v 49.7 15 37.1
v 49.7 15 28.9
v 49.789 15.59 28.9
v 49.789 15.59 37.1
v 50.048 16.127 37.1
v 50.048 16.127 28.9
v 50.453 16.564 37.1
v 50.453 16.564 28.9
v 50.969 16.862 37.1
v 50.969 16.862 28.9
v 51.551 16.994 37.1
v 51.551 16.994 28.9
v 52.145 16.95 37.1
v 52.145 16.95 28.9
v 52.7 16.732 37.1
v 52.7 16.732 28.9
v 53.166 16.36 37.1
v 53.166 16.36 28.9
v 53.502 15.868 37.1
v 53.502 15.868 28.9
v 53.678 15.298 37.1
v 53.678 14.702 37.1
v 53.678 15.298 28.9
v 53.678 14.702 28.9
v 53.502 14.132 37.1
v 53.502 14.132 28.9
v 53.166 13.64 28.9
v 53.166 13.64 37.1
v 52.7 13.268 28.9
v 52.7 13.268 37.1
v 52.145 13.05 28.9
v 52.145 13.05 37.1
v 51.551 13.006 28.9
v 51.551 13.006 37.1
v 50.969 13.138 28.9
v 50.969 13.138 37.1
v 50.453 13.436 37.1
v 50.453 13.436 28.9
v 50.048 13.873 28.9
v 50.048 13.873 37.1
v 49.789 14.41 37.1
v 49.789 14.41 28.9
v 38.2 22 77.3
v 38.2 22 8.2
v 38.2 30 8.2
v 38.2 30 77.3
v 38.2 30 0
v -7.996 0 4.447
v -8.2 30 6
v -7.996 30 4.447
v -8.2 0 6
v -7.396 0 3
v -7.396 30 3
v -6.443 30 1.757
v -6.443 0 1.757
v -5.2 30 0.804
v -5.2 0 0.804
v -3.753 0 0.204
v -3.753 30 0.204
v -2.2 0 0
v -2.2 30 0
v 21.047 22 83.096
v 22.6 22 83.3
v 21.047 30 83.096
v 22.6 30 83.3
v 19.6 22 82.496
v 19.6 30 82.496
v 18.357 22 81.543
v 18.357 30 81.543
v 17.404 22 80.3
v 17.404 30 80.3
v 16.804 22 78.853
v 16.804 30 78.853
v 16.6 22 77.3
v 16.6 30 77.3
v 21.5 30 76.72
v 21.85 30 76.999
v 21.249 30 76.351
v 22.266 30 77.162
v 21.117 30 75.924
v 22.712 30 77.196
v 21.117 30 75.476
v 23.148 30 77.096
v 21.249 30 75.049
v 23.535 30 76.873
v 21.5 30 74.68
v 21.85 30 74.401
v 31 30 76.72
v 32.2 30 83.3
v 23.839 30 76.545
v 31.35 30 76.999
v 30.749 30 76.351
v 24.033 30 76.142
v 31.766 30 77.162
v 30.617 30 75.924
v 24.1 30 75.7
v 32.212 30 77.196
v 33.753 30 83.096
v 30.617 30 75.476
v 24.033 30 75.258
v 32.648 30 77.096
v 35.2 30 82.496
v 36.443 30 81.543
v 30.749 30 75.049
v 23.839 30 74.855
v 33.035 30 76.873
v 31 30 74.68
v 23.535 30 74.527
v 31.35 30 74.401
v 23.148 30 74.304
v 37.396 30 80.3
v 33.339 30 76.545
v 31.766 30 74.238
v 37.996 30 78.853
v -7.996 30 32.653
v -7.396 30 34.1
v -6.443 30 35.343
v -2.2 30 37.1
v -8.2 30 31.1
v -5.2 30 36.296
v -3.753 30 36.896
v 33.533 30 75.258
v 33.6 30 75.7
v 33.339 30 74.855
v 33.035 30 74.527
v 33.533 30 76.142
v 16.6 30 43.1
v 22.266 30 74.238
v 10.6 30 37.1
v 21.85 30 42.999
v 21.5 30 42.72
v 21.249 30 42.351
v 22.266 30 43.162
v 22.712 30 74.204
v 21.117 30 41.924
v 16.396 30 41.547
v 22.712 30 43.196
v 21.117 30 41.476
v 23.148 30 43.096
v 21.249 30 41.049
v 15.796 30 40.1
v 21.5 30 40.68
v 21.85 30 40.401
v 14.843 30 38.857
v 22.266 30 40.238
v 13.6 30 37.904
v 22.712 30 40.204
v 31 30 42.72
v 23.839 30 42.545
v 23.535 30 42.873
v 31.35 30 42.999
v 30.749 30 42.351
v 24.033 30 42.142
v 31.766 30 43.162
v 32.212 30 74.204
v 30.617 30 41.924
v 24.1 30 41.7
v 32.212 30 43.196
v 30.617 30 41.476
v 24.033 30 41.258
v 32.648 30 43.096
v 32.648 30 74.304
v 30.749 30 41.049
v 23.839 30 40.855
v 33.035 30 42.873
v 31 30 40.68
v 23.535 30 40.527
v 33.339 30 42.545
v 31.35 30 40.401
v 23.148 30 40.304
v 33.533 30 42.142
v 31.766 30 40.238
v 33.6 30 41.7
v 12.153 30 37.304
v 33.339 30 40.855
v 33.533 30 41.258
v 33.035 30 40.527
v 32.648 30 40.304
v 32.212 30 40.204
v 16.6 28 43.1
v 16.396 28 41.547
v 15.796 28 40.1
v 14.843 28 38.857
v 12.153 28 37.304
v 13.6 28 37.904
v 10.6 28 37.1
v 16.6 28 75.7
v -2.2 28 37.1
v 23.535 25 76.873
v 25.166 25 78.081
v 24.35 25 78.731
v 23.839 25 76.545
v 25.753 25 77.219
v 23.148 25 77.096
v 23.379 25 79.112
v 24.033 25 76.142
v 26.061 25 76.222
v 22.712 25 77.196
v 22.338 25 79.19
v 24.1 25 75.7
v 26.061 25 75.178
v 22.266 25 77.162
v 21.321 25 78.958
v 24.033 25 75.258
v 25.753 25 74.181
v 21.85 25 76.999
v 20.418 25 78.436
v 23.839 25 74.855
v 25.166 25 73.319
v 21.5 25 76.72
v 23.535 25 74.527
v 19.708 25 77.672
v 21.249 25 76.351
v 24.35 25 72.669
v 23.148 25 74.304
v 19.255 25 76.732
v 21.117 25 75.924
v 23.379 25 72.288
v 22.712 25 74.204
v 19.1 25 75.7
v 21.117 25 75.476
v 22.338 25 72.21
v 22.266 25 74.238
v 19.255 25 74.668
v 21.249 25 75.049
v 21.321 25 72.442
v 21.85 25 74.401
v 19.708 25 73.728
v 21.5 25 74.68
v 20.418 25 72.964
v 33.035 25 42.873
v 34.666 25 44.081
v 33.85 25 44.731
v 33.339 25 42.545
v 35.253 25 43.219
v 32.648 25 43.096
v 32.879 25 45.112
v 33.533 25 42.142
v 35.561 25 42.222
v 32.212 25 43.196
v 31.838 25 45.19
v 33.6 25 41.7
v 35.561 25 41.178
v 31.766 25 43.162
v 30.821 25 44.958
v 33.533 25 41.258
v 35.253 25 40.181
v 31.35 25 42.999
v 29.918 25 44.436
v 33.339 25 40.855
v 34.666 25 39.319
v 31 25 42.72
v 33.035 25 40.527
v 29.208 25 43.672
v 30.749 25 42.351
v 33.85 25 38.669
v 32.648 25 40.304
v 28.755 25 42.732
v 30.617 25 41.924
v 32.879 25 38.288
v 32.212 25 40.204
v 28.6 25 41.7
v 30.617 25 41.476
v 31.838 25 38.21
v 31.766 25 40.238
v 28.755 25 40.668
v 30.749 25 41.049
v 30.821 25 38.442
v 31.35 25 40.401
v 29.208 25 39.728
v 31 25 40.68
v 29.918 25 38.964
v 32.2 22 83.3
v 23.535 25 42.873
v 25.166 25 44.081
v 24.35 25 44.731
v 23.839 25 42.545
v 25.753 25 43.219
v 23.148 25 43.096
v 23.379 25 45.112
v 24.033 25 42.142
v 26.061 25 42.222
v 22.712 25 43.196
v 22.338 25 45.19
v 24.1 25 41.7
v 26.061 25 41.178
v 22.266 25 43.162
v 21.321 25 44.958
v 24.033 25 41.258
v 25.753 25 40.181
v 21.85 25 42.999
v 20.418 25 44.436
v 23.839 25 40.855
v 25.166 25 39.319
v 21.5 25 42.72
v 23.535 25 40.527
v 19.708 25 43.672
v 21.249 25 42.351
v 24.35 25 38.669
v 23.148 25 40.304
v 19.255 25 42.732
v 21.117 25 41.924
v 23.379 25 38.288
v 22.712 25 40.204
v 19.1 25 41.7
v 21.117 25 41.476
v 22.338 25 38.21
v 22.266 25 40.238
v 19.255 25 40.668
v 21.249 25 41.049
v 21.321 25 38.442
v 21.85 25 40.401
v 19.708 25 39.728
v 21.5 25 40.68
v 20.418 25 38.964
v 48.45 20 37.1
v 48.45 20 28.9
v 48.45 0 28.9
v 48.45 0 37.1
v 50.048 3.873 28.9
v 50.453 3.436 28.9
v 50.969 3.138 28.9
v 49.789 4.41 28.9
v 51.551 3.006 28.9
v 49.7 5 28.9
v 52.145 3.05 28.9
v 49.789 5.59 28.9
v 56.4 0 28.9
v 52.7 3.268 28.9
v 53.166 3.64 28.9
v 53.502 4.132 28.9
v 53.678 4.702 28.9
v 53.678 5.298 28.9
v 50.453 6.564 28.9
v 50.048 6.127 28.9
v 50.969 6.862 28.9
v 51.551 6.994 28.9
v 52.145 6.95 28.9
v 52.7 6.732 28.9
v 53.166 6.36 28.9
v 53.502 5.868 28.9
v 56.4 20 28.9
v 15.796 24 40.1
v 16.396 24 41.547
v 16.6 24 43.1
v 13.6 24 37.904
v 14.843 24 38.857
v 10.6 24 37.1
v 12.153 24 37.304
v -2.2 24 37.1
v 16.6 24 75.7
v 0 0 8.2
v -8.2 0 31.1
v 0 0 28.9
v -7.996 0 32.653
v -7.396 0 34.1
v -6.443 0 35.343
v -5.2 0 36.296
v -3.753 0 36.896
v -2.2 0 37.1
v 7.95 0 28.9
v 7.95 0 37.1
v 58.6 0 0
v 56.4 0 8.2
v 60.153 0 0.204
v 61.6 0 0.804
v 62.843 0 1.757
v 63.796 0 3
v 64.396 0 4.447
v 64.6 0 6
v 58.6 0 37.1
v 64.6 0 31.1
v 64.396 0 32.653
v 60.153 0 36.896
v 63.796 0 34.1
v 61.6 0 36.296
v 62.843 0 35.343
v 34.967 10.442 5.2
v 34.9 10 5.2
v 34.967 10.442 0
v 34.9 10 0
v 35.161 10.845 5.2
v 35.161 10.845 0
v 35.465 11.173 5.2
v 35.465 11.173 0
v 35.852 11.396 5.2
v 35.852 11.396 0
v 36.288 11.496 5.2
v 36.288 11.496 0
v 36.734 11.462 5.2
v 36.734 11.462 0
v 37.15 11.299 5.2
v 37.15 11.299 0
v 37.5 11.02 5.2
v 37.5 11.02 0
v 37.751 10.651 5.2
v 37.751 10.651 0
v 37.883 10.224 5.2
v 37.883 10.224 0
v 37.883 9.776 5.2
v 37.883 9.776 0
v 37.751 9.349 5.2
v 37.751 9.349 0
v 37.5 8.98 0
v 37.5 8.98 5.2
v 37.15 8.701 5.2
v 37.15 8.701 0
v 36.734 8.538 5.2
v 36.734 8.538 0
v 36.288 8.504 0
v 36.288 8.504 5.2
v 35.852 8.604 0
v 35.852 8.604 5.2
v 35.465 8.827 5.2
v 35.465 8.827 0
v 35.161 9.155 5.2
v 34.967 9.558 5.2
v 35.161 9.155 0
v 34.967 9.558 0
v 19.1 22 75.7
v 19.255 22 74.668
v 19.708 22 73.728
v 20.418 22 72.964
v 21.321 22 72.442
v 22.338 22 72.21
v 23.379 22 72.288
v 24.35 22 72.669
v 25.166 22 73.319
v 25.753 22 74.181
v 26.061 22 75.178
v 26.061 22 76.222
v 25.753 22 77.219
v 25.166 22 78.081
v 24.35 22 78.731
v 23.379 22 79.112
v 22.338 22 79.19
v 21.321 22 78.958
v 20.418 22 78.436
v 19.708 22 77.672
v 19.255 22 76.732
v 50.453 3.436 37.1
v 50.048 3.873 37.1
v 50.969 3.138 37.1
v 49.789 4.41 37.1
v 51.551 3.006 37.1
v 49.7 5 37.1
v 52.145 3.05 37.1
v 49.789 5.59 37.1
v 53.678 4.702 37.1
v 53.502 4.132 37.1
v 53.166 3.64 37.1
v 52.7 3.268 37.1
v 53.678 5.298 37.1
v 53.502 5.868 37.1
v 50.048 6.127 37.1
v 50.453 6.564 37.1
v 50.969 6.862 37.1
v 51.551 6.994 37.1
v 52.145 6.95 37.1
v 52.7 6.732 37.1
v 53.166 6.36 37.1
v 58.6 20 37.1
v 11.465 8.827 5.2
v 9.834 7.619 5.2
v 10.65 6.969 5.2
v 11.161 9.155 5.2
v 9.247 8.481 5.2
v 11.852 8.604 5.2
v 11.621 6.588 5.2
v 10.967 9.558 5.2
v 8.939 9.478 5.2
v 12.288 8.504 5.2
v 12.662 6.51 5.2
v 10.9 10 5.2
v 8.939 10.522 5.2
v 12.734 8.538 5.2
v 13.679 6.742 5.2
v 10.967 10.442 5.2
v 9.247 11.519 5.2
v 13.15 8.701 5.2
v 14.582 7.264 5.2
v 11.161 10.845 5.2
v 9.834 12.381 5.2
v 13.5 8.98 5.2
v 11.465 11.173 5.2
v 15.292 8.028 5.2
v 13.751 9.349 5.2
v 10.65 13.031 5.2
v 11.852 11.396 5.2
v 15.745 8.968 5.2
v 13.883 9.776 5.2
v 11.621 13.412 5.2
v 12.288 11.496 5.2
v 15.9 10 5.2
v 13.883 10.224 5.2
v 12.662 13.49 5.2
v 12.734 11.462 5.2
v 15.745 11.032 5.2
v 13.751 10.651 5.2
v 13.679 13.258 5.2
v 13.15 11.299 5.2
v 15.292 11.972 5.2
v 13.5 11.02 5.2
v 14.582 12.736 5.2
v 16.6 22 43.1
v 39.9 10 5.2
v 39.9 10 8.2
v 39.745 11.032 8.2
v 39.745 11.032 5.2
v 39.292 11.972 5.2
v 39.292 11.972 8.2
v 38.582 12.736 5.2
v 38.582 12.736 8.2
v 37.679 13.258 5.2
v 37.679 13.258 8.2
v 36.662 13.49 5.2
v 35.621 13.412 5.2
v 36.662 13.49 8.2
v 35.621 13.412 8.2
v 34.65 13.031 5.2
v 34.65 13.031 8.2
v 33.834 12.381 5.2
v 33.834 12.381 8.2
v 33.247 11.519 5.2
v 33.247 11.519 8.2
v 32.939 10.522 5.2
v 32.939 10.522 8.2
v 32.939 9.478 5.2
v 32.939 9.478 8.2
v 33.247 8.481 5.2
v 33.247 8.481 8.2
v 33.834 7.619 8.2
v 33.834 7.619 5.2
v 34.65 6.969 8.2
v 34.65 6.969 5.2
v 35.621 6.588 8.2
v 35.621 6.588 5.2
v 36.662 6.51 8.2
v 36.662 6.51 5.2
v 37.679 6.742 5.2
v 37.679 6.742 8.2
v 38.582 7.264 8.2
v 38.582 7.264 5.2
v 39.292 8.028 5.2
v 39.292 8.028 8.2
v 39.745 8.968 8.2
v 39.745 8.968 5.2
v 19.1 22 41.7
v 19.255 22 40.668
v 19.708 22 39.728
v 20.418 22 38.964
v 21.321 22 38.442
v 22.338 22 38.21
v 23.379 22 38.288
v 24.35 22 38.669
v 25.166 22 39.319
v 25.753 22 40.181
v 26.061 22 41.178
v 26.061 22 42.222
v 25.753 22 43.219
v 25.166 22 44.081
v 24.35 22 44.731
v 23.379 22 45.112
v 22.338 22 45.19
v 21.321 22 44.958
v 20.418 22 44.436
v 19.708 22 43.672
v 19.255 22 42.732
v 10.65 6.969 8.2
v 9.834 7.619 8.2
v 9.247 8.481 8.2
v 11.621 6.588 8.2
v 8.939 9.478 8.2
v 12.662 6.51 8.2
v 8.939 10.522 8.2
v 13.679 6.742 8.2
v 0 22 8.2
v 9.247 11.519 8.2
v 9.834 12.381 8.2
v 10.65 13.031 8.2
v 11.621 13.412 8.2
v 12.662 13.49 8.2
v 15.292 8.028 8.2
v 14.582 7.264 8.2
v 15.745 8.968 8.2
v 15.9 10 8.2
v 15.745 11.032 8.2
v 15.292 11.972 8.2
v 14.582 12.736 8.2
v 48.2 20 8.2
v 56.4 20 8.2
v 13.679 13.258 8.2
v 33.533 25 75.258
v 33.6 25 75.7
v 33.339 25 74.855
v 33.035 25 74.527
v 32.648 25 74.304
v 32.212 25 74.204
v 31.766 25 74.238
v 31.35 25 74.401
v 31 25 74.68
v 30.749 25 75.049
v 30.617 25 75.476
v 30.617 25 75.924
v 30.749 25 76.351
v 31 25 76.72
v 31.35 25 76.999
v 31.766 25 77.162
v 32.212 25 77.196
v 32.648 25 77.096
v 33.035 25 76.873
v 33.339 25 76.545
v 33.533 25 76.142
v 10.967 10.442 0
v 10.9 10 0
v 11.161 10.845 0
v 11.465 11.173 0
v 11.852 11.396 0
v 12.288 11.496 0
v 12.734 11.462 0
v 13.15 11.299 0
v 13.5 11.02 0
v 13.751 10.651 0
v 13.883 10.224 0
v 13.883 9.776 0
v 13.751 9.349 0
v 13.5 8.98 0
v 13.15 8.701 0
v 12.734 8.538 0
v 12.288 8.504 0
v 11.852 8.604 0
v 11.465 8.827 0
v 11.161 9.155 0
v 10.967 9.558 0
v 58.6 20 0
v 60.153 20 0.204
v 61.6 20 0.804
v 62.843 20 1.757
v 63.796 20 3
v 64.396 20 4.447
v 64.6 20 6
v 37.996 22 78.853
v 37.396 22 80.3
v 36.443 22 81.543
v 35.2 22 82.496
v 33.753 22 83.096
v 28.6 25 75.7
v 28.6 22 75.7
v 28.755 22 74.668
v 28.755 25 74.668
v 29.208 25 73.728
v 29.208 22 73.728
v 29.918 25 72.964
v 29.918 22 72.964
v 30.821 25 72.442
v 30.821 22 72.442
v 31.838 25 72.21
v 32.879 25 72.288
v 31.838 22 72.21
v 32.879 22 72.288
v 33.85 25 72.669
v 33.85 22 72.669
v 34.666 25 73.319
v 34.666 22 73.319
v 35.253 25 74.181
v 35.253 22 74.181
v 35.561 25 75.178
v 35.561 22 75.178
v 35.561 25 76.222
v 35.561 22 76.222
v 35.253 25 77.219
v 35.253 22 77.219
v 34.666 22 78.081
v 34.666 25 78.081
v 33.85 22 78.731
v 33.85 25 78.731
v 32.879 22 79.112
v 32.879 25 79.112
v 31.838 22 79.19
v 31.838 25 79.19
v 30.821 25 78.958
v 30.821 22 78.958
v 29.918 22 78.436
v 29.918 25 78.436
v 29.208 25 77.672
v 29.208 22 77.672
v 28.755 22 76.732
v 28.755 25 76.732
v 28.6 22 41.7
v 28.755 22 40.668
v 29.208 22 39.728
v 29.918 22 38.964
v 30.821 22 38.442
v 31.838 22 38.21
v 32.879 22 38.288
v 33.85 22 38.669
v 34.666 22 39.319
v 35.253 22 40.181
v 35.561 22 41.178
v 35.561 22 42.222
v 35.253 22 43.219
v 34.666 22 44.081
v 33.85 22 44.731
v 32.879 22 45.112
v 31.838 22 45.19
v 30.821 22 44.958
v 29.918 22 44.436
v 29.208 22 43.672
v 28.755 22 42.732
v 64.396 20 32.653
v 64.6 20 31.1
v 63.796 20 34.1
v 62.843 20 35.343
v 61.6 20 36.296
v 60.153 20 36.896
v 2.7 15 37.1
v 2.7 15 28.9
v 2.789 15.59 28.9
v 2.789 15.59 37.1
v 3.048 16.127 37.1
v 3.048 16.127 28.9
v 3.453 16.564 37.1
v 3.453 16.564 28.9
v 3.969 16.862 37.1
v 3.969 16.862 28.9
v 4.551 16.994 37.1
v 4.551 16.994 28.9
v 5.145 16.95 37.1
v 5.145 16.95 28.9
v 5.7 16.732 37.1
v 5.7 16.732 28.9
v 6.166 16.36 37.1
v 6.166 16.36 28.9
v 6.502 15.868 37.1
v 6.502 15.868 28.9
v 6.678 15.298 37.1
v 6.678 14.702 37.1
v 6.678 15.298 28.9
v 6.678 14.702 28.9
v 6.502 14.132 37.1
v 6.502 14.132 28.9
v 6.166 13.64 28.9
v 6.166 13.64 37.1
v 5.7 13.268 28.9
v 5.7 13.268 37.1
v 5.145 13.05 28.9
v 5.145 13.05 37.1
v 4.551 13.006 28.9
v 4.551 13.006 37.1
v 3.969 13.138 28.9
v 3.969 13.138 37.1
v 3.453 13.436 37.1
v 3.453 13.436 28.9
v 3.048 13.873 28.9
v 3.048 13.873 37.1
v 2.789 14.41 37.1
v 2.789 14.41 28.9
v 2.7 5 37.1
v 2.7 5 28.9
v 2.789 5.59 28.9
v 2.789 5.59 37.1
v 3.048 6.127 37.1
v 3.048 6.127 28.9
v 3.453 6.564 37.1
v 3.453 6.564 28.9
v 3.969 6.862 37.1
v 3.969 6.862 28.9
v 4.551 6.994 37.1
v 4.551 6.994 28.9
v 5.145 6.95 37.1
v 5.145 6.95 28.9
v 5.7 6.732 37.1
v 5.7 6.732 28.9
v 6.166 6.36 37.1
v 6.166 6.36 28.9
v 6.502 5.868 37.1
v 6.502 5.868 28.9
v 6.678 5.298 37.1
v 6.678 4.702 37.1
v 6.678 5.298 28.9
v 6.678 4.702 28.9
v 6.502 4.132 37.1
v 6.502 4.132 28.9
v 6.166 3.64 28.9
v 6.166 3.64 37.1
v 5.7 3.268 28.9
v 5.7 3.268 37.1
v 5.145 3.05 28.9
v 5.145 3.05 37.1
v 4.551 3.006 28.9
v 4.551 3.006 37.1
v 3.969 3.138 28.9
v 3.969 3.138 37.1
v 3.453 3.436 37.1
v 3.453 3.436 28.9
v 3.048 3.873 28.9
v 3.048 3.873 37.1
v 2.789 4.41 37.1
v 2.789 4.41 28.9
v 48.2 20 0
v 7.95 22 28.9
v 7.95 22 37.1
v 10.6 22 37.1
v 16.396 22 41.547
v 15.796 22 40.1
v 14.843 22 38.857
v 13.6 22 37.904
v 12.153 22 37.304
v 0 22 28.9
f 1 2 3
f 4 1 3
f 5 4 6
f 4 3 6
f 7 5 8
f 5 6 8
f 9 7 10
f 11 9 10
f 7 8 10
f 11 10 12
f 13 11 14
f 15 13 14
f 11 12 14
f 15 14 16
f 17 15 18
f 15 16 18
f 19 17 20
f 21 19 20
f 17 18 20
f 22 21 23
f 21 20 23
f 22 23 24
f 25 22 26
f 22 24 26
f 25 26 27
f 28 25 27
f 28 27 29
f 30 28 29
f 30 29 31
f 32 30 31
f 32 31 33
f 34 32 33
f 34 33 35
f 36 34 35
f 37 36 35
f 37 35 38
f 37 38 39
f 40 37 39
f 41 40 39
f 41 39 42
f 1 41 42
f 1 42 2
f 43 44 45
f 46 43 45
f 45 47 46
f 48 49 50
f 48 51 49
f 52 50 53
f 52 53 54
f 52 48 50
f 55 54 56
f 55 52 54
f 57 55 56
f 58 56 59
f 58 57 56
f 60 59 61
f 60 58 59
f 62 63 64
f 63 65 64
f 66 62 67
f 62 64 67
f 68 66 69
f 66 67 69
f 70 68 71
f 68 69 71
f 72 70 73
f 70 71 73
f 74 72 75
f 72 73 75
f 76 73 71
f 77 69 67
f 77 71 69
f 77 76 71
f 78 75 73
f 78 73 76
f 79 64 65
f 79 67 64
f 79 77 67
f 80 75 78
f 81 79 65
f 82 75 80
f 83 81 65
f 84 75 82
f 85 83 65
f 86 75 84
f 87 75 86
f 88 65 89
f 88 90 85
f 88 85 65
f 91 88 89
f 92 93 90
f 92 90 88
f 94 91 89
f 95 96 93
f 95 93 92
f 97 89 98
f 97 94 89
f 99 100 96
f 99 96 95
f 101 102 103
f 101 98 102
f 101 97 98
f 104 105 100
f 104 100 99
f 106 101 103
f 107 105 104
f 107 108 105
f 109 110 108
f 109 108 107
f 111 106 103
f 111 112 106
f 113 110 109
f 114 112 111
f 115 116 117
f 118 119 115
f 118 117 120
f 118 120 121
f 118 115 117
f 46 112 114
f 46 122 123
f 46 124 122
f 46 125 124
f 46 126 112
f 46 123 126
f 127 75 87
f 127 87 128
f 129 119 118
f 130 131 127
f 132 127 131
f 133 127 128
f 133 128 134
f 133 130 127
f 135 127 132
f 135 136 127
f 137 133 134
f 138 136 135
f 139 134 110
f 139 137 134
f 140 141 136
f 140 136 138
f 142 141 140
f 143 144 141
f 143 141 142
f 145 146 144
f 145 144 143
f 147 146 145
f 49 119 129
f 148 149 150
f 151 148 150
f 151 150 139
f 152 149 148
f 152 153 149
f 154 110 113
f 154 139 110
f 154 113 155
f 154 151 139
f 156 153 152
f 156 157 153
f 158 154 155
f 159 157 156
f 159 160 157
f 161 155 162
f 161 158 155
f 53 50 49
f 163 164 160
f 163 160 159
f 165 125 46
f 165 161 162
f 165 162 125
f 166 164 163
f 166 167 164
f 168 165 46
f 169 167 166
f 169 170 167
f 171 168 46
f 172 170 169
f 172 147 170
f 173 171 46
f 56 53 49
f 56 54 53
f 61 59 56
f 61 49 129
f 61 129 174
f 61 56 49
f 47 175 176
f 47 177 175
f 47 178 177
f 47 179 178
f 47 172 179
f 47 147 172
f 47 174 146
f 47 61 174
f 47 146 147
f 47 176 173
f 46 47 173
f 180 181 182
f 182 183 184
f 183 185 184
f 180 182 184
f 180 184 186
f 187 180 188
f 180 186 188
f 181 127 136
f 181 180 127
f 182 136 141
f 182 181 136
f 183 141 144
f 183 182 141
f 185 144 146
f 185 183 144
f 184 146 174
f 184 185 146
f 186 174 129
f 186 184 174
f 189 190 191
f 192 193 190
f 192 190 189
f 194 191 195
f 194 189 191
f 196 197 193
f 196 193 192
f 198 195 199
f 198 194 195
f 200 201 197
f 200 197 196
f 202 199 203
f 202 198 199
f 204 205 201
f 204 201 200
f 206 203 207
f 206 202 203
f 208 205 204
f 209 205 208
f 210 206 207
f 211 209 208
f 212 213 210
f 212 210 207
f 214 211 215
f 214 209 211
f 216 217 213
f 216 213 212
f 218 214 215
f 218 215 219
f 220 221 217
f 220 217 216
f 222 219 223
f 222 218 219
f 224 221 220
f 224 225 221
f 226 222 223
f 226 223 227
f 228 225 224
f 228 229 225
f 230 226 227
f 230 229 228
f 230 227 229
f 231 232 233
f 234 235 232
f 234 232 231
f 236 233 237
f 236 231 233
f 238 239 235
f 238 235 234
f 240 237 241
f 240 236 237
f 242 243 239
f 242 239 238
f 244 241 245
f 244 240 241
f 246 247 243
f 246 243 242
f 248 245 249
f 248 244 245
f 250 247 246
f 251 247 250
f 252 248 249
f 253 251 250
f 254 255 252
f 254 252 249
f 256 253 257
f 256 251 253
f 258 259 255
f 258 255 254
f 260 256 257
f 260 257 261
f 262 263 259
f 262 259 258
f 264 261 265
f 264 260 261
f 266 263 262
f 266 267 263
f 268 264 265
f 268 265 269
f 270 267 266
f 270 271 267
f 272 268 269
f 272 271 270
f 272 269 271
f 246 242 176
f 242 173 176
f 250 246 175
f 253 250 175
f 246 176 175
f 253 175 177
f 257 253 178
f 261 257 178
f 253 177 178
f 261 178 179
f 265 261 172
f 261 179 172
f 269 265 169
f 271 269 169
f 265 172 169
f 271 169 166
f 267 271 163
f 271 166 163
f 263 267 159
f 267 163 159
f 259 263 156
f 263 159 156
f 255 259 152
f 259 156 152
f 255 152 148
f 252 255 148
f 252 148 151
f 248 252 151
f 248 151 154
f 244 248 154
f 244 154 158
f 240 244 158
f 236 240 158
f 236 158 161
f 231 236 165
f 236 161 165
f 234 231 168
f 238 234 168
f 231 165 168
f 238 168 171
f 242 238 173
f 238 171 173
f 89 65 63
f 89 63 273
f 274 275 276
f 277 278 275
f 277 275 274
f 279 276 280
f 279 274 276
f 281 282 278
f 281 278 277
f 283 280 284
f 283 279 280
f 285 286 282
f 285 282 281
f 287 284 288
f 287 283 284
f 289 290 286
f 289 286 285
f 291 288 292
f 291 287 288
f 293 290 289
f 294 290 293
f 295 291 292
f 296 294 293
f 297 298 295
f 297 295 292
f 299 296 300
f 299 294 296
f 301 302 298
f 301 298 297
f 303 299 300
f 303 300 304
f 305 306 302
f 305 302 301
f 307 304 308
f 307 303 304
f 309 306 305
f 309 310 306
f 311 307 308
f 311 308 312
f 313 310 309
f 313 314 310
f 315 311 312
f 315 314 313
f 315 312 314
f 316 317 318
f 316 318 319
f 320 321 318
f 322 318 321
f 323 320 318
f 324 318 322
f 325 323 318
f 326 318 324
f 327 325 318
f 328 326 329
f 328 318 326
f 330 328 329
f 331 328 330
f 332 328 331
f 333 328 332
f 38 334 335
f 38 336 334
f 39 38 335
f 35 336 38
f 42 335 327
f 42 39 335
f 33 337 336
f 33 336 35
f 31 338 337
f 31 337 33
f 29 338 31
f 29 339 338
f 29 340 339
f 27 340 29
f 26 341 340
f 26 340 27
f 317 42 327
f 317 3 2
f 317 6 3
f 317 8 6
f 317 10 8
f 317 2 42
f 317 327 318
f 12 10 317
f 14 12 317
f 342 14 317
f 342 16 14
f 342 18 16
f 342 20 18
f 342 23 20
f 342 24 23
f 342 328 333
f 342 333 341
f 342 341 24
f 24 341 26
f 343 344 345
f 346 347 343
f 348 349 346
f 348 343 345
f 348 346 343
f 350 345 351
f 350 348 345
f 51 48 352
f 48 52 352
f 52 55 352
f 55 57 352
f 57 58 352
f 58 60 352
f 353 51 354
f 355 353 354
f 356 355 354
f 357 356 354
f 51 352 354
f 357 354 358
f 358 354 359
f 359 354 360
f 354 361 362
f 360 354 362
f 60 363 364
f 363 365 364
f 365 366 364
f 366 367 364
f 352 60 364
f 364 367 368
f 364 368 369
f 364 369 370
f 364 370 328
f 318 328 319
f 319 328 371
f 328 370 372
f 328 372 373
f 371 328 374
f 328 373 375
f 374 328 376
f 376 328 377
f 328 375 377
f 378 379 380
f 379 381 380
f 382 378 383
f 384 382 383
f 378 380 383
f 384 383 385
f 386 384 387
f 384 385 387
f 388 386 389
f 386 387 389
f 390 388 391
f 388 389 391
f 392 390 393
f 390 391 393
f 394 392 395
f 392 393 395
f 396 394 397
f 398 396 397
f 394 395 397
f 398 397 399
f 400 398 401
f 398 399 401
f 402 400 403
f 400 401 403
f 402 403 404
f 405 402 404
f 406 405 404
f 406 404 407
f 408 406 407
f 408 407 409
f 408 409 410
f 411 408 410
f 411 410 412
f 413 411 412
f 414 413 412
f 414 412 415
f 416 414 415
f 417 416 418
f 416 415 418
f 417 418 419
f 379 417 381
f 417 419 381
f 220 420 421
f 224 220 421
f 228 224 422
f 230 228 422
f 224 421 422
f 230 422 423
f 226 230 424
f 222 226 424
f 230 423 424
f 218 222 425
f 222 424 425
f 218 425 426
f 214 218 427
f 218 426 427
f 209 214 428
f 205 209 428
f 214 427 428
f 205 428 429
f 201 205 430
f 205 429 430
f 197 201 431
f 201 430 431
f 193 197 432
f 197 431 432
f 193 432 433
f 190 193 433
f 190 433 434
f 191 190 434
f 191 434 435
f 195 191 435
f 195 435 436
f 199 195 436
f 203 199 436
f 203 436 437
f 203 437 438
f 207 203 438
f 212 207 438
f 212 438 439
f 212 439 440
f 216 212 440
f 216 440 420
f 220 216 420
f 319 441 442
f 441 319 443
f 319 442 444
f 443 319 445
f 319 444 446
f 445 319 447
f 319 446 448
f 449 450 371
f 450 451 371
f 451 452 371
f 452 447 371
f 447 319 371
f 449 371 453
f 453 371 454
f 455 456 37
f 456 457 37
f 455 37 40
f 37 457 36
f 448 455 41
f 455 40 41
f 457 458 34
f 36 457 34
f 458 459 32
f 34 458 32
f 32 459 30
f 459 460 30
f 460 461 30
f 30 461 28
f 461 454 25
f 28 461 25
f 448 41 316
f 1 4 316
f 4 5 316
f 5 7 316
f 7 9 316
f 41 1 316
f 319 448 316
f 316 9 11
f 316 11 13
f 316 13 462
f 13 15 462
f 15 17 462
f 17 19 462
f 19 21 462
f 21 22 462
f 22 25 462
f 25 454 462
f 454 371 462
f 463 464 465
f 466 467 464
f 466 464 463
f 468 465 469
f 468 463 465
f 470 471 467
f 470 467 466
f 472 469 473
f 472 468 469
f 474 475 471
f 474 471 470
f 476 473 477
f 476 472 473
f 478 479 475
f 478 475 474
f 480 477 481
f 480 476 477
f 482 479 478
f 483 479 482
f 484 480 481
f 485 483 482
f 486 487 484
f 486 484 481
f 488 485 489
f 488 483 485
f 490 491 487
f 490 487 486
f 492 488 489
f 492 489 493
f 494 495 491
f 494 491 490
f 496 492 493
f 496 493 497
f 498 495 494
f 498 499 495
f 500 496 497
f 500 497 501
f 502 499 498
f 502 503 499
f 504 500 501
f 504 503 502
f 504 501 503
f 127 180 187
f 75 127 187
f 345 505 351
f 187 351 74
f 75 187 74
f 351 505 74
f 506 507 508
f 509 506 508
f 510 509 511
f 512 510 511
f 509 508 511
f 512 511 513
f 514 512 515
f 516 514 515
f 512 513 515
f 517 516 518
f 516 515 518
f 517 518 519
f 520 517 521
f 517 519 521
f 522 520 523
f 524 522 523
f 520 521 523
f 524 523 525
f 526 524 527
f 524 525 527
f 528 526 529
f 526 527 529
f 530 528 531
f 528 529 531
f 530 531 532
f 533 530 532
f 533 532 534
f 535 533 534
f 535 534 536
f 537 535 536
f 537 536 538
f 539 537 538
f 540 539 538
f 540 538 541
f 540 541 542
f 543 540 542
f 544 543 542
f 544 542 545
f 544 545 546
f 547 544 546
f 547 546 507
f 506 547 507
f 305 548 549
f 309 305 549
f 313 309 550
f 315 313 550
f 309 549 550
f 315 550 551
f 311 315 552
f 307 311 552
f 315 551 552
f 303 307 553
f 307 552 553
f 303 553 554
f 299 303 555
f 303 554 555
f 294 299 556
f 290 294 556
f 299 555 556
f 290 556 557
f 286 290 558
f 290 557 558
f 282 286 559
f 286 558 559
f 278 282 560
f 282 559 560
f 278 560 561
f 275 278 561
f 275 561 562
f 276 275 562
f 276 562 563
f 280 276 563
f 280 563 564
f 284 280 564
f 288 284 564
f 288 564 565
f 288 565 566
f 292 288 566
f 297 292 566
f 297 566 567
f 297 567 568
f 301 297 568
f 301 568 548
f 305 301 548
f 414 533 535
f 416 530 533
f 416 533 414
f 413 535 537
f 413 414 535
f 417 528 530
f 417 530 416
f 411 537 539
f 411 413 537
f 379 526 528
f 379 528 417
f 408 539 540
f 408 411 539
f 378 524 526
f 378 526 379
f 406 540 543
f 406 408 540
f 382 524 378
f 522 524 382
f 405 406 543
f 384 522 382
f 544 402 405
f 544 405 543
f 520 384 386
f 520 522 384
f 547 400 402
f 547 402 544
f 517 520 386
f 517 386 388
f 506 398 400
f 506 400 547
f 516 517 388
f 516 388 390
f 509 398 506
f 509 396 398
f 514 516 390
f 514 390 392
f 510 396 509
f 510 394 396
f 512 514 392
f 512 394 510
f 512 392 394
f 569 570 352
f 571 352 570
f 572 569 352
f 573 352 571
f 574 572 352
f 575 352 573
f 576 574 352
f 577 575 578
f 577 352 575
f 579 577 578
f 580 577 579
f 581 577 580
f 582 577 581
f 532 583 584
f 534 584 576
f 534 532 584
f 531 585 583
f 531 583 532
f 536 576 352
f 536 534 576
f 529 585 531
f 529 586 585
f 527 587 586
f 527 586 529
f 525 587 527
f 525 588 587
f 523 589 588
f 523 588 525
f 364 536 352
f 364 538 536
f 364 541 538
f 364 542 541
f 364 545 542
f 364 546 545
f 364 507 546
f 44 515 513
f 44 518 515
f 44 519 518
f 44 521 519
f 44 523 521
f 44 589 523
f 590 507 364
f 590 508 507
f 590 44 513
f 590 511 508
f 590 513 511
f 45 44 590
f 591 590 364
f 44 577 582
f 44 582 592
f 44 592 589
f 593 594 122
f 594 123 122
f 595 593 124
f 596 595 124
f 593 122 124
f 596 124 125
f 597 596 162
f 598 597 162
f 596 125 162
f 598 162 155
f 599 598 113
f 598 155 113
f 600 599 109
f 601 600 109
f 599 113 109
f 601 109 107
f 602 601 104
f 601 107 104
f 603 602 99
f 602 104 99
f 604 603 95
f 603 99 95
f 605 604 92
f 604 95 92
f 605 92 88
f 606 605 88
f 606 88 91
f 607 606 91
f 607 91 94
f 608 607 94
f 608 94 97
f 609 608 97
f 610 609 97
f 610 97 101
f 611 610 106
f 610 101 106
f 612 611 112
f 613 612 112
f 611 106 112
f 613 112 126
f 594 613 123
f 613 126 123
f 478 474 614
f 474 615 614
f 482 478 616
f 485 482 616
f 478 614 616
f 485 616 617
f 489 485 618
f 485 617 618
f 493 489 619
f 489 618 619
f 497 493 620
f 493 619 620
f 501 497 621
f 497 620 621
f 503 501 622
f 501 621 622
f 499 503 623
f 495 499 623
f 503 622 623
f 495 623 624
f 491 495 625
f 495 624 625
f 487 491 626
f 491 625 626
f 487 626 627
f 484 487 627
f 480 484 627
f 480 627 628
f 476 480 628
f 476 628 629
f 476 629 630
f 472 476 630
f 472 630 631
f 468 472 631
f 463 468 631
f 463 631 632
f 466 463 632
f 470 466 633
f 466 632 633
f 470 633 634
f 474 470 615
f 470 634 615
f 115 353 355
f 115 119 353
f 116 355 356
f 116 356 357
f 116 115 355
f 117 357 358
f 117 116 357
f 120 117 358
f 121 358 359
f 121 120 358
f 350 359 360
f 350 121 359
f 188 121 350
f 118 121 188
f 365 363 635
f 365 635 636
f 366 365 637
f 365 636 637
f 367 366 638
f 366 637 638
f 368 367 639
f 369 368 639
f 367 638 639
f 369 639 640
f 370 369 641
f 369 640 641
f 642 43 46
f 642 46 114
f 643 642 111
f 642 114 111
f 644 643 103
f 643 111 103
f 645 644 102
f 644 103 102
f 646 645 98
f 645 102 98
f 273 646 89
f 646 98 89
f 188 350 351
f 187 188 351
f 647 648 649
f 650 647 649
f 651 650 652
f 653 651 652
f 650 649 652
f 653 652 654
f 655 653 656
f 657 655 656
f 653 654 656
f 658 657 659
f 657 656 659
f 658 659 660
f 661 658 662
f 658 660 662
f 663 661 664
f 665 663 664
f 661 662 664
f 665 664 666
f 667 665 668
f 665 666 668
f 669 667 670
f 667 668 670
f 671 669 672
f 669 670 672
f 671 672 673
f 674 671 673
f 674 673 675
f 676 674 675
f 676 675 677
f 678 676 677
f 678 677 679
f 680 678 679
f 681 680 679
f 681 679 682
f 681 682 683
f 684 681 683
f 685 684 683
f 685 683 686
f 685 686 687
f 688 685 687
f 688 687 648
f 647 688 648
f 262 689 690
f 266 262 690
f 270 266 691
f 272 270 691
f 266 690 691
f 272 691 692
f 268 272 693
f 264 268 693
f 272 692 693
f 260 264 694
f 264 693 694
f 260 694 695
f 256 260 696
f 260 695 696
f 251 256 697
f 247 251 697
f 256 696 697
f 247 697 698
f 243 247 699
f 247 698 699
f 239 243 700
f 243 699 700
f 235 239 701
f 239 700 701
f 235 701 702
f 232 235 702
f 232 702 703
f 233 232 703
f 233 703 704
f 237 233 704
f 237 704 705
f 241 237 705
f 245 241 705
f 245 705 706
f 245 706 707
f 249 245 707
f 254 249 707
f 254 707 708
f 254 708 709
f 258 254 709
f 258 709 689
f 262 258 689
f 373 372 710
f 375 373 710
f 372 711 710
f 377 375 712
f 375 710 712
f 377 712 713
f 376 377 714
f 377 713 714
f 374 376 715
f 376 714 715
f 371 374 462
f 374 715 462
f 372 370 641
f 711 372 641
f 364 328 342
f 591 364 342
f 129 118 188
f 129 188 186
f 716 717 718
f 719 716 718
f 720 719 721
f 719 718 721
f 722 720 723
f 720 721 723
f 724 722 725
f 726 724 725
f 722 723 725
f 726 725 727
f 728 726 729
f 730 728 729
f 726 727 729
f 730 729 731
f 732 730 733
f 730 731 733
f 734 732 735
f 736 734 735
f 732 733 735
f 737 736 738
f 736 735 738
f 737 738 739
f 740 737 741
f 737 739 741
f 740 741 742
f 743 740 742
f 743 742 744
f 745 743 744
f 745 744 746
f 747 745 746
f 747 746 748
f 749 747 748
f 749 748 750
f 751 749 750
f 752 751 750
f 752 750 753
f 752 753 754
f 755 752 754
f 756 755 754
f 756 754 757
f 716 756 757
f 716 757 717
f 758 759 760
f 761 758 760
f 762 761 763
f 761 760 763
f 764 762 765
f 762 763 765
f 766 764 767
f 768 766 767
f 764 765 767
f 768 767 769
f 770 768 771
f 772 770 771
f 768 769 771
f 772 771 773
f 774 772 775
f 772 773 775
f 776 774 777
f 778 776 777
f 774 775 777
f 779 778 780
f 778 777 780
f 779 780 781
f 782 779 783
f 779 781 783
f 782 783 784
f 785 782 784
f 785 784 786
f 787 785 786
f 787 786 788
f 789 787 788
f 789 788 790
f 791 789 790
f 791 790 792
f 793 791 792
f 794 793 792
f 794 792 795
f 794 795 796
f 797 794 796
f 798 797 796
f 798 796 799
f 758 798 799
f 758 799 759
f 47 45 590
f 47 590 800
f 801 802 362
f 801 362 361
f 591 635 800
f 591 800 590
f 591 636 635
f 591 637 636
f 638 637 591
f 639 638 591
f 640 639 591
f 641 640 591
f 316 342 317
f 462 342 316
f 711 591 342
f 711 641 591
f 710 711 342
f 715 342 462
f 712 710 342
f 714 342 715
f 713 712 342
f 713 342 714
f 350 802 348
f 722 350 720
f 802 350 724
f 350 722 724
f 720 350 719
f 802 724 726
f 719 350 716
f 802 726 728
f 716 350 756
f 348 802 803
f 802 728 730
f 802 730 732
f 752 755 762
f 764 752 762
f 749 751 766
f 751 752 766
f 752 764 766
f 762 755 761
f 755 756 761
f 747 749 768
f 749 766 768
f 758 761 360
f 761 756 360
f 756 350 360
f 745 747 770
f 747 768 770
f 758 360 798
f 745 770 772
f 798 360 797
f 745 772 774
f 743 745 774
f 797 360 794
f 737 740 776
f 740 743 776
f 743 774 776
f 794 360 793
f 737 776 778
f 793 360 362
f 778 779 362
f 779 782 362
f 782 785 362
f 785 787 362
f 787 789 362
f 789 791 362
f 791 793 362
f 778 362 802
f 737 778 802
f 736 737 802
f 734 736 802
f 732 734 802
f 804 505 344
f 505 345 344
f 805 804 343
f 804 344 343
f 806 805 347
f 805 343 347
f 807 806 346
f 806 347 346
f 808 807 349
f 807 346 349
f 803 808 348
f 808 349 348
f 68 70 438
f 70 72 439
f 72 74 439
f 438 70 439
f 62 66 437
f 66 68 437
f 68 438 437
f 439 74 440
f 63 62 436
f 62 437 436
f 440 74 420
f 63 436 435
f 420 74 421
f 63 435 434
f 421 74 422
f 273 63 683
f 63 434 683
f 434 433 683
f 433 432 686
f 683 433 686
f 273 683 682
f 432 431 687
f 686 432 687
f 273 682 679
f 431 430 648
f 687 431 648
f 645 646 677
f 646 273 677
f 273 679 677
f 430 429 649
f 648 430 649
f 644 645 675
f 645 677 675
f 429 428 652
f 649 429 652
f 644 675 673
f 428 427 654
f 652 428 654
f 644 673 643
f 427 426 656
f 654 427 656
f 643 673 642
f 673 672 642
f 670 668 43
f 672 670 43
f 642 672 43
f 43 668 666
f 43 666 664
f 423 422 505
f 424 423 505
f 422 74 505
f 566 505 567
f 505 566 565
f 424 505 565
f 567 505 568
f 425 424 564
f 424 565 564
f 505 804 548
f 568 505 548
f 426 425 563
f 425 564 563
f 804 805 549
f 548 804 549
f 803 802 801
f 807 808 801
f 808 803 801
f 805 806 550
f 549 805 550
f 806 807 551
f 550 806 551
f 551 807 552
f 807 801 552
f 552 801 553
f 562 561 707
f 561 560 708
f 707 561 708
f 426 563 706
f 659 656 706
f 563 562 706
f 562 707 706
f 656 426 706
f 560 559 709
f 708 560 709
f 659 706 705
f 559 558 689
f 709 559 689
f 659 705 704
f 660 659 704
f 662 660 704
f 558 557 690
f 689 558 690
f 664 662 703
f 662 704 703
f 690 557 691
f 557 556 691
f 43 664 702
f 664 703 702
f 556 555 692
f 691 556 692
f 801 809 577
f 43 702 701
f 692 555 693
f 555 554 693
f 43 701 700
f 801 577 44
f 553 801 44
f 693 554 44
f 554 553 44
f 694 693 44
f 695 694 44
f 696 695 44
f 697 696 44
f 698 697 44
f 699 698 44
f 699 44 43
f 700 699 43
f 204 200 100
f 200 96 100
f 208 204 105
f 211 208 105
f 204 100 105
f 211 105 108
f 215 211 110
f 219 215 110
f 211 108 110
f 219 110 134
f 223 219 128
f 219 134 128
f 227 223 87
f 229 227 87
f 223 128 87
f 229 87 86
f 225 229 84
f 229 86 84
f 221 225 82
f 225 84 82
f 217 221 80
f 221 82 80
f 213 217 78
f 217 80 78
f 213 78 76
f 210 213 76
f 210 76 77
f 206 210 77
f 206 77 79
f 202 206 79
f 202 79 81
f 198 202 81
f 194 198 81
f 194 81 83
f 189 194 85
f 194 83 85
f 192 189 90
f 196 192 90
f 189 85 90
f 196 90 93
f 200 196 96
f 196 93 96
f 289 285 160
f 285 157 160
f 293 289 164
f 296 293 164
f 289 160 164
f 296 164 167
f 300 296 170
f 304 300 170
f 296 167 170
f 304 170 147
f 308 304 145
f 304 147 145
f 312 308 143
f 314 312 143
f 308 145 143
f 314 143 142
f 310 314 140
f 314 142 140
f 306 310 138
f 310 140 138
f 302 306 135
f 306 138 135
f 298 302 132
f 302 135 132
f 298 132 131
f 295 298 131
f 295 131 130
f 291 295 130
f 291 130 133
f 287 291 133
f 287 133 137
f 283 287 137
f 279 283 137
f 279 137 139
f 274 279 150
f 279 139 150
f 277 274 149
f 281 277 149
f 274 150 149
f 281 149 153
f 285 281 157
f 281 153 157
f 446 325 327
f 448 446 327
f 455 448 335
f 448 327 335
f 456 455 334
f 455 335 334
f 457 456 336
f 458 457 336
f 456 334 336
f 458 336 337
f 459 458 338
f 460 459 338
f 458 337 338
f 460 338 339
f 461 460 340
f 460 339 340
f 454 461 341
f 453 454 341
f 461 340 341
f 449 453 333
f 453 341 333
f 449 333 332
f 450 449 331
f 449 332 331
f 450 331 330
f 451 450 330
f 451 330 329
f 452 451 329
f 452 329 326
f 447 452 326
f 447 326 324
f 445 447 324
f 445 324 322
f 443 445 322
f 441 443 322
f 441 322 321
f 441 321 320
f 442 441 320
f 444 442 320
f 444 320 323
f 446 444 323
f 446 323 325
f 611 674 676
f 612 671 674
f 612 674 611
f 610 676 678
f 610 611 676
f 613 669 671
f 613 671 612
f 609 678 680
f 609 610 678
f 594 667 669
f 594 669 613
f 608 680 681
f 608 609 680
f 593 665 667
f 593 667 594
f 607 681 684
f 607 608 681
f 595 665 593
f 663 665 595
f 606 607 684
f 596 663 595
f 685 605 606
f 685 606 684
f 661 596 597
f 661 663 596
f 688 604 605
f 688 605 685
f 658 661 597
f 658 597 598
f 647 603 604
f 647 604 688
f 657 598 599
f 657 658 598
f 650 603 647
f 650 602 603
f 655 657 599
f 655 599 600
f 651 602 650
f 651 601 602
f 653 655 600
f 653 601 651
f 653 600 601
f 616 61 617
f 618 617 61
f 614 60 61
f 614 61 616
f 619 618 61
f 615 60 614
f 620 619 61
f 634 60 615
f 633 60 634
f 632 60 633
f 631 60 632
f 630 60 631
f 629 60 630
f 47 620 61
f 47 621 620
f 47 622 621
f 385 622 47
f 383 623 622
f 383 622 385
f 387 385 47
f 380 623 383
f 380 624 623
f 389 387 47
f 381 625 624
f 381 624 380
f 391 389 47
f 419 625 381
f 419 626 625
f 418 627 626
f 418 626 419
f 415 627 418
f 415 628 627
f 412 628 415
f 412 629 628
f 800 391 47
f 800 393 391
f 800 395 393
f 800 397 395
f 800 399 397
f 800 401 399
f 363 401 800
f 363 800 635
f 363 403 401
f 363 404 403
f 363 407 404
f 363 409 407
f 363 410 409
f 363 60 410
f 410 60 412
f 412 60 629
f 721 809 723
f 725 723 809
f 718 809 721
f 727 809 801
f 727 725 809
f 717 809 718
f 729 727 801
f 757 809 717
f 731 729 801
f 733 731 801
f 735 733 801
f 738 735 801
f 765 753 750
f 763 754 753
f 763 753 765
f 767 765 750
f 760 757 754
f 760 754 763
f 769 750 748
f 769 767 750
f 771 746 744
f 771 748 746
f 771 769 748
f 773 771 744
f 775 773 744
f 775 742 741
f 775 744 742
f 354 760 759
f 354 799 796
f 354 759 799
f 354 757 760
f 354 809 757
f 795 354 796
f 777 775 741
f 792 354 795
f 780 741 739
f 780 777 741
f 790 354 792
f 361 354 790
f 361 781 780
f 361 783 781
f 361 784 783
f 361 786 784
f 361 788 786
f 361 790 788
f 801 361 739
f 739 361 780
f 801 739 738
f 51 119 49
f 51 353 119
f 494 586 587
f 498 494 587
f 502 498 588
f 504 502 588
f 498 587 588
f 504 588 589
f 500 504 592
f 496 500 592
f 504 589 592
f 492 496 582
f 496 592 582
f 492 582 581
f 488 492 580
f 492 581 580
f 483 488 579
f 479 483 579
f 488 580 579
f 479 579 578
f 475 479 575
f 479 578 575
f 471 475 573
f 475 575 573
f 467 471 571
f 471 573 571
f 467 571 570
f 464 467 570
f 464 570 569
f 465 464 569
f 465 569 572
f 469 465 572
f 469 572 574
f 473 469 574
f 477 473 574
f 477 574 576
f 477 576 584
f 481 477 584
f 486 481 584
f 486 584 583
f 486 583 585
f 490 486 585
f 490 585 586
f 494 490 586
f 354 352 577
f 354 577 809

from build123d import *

# Parameters (mm, degrees)
SCHIZZO1_W                                   = 64.6
SCHIZZO1_H                                   = 20
ESTRUSIONE_ESTRUSIONE1_DEPTH                 = 8.2
SCHIZZO2_W                                   = 8.2
SCHIZZO2_H                                   = 20
ESTRUSIONE_ESTRUSIONE2_DEPTH                 = 28.9
SCHIZZO3_W                                   = 8.2
SCHIZZO3_H                                   = 20
ESTRUSIONE_ESTRUSIONE3_DEPTH                 = 28.9
SCHIZZO4_W                                   = 8.2
SCHIZZO4_H                                   = 20
ESTRUSIONE_ESTRUSIONE4_DEPTH                 = 8.2
SCHIZZO5_W                                   = 37.1
SCHIZZO5_H                                   = 20
ESTRUSIONE_ESTRUSIONE5_DEPTH                 = 8.2
SCHIZZO6_W                                   = 48.2
SCHIZZO6_H                                   = 20.7
TAGLIO_ESTRUSIONE1_DEPTH                     = 78.133455776
F_4_0_4_DIAMETER_HOLE2_D                     = 4
F_4_0_4_DIAMETER_HOLE2_DEPTH                 = 8.2
RACCORDO3_R                                  = 6
CBORE_FOR_M3_HEX_HEAD_CAP_SCREW1_D           = 3
CBORE_FOR_M3_HEX_HEAD_CAP_SCREW1_CBORE_D     = 7
CBORE_FOR_M3_HEX_HEAD_CAP_SCREW1_CBORE_DEPTH = 3
SKETCH5_W                                    = 46.4
SKETCH5_H                                    = 37.1
BOSS_EXTRUDE1_DEPTH                          = 10
FILLET3_R                                    = 6
CHAMFER2_SIZE                                = 10
CUT_EXTRUDE2_DEPTH                           = 2
SKETCH9_W                                    = 40.4
SKETCH9_H                                    = 8
BOSS_EXTRUDE2_DEPTH                          = 46.2
CBORE_FOR_M3_HEX_HEAD_CAP_SCREW2_D           = 3
CBORE_FOR_M3_HEX_HEAD_CAP_SCREW2_CBORE_D     = 7
CBORE_FOR_M3_HEX_HEAD_CAP_SCREW2_CBORE_DEPTH = 3
CUT_EXTRUDE3_DEPTH                           = 108.684957167
FILLET4_R                                    = 6
SKETCH15_W                                   = 8.2
SKETCH15_H                                   = 20
CUT_EXTRUDE4_DEPTH                           = 0.25
SKETCH16_W                                   = 8.2
SKETCH16_H                                   = 22
CUT_EXTRUDE5_DEPTH                           = 0.25
CUT_EXTRUDE6_DEPTH                           = 2
CUT_EXTRUDE7_DEPTH                           = 2
FILLET5_R                                    = 6
FILLET6_R                                    = 6


with BuildPart() as part:
    # Schizzo1 → Estrusione-Estrusione1 (new body)
    with BuildSketch(Plane.XY):
        with Locations((32.3, 10)):
            Rectangle(SCHIZZO1_W, SCHIZZO1_H)
    extrude(amount=ESTRUSIONE_ESTRUSIONE1_DEPTH)

    # Schizzo2 → Estrusione-Estrusione2 (add)
    with BuildSketch(Plane.XY.offset(8.2)):
        with Locations((4.1, 10)):
            Rectangle(SCHIZZO2_W, SCHIZZO2_H)
    extrude(amount=ESTRUSIONE_ESTRUSIONE2_DEPTH)

    # Schizzo3 → Estrusione-Estrusione3 (add)
    with BuildSketch(Plane.XY.offset(8.2)):
        with Locations((60.5, 10)):
            Rectangle(SCHIZZO3_W, SCHIZZO3_H)
    extrude(amount=ESTRUSIONE_ESTRUSIONE3_DEPTH)

    # Schizzo4 → Estrusione-Estrusione4 (add)
    with BuildSketch(Plane.ZY.offset(-56.4)):
        with Locations((33, 10)):
            Rectangle(SCHIZZO4_W, SCHIZZO4_H)
    extrude(amount=ESTRUSIONE_ESTRUSIONE4_DEPTH)

    # Schizzo5 → Estrusione-Estrusione5 (add)
    with BuildSketch(Plane.ZY):
        with Locations((18.55, 10)):
            Rectangle(SCHIZZO5_W, SCHIZZO5_H)
    extrude(amount=ESTRUSIONE_ESTRUSIONE5_DEPTH)

    # Schizzo6 → Taglio-Estrusione1 (cut, through all)
    with BuildSketch(Plane.XZ):
        with Locations((24.1, 18.55)):
            Rectangle(SCHIZZO6_W, SCHIZZO6_H)
    extrude(amount=-TAGLIO_ESTRUSIONE1_DEPTH, mode=Mode.SUBTRACT)

    # Ø4.0 (4) Diameter Hole2
    with Locations(Plane.XY.offset(37.1)):
        with Locations((51.7, 5), (4.7, 5), (4.7, 15), (51.7, 15)):
            Hole(F_4_0_4_DIAMETER_HOLE2_D / 2, depth=F_4_0_4_DIAMETER_HOLE2_DEPTH)

    # Raccordo3
    raccordo3_edges = [part.edges().sort_by_distance(p)[0] for p in [
        (64.6, 10, 37.1),
        (64.6, 10, 0),
    ]]
    fillet(raccordo3_edges, radius=RACCORDO3_R)

    # CBORE for M3 Hex Head Cap Screw1 (through all)
    with Locations(Plane.XY.offset(8.2)):
        with Locations((36.4, 10), (12.4, 10)):
            CounterBoreHole(CBORE_FOR_M3_HEX_HEAD_CAP_SCREW1_D / 2, CBORE_FOR_M3_HEX_HEAD_CAP_SCREW1_CBORE_D / 2, CBORE_FOR_M3_HEX_HEAD_CAP_SCREW1_CBORE_DEPTH)

    # Sketch5 → Boss-Extrude1 (add)
    with BuildSketch(Plane(origin=(0, 20, 0), x_dir=(1, 0, 0), z_dir=(0, 1, 0))):
        with Locations((15, -18.55)):
            Rectangle(SKETCH5_W, SKETCH5_H)
    extrude(amount=BOSS_EXTRUDE1_DEPTH)

    # Fillet3
    fillet3_edges = [part.edges().sort_by_distance(p)[0] for p in [
        (-8.2, 15, 37.1),
        (-8.2, 15, 0),
    ]]
    fillet(fillet3_edges, radius=FILLET3_R)

    # Chamfer2
    chamfer2_edges = [part.edges().sort_by_distance(p)[0] for p in [
        (38.2, 20, 4.1),
    ]]
    chamfer(chamfer2_edges, length=CHAMFER2_SIZE - 0.0001)  # a hair under: the kernel refuses the full size

    # Sketch8 → Cut-Extrude2 (cut)
    with BuildSketch(Plane(origin=(0, 20, 0), x_dir=(-1, 0, 0), z_dir=(0, -1, 0))):
        Polygon((-38.2, -37.1), (-38.2, -8.2), (0, -8.2), (0, -28.9), (-8.2, -28.9), (-8.2, -37.1), align=None)
    extrude(amount=-CUT_EXTRUDE2_DEPTH, mode=Mode.SUBTRACT)

    # Sketch9 → Boss-Extrude2 (add)
    with BuildSketch(Plane.XY.offset(37.1)):
        with Locations((18, 26)):
            Rectangle(SKETCH9_W, SKETCH9_H)
    extrude(amount=BOSS_EXTRUDE2_DEPTH)

    # CBORE for M3 Hex Head Cap Screw2 (through all)
    with Locations(Plane(origin=(0, 22, 0), x_dir=(-1, 0, 0), z_dir=(0, -1, 0))):
        with Locations((-22.6, -41.7), (-32.1, -41.7), (-22.6, -75.7), (-32.1, -75.7)):
            CounterBoreHole(CBORE_FOR_M3_HEX_HEAD_CAP_SCREW2_D / 2, CBORE_FOR_M3_HEX_HEAD_CAP_SCREW2_CBORE_D / 2, CBORE_FOR_M3_HEX_HEAD_CAP_SCREW2_CBORE_DEPTH)

    # Sketch13 → Cut-Extrude3 (cut, through all)
    with BuildSketch(Plane(origin=(0, 22, 0), x_dir=(-1, 0, 0), z_dir=(0, -1, 0))):
        Polygon((-16.6, -75.7), (-16.6, -83.3), (2.2, -83.3), (2.2, -37.1), align=None)
    extrude(amount=-CUT_EXTRUDE3_DEPTH, mode=Mode.SUBTRACT)

    # Fillet4
    fillet4_edges = [part.edges().sort_by_distance(p)[0] for p in [
        (38.2, 26, 83.3),
    ]]
    fillet(fillet4_edges, radius=FILLET4_R)

    # Sketch15 → Cut-Extrude4 (cut)
    with BuildSketch(Plane.ZY.offset(-48.2)):
        with Locations((33, 10)):
            Rectangle(SKETCH15_W, SKETCH15_H)
    extrude(amount=-CUT_EXTRUDE4_DEPTH, mode=Mode.SUBTRACT)

    # Sketch16 → Cut-Extrude5 (cut)
    with BuildSketch(Plane(origin=(8.2, 0, 0), x_dir=(0, 0, -1), z_dir=(1, 0, 0))):
        with Locations((-33, 11)):
            Rectangle(SKETCH16_W, SKETCH16_H)
    extrude(amount=-CUT_EXTRUDE5_DEPTH, mode=Mode.SUBTRACT)

    # Sketch21 → Cut-Extrude6 (cut)
    with BuildSketch(Plane(origin=(0, 30, 0), x_dir=(1, 0, 0), z_dir=(0, 1, 0))):
        Polygon((-2.2, -37.1), (16.6, -37.1), (16.6, -75.7), align=None)
    extrude(amount=-CUT_EXTRUDE6_DEPTH, mode=Mode.SUBTRACT)

    # Sketch22 → Cut-Extrude7 (cut)
    with BuildSketch(Plane(origin=(0, 22, 0), x_dir=(-1, 0, 0), z_dir=(0, -1, 0))):
        Polygon((2.2, -37.1), (-16.6, -37.1), (-16.6, -75.7), align=None)
    extrude(amount=-CUT_EXTRUDE7_DEPTH, mode=Mode.SUBTRACT)

    # Fillet5
    fillet5_edges = [part.edges().sort_by_distance(p)[0] for p in [
        (16.6, 26, 83.3),
    ]]
    fillet(fillet5_edges, radius=FILLET5_R)

    # Fillet6
    fillet6_edges = [part.edges().sort_by_distance(p)[0] for p in [
        (16.6, 29, 37.1),
        (16.6, 23, 37.1),
    ]]
    fillet(fillet6_edges, radius=FILLET6_R)


solid = part.part
